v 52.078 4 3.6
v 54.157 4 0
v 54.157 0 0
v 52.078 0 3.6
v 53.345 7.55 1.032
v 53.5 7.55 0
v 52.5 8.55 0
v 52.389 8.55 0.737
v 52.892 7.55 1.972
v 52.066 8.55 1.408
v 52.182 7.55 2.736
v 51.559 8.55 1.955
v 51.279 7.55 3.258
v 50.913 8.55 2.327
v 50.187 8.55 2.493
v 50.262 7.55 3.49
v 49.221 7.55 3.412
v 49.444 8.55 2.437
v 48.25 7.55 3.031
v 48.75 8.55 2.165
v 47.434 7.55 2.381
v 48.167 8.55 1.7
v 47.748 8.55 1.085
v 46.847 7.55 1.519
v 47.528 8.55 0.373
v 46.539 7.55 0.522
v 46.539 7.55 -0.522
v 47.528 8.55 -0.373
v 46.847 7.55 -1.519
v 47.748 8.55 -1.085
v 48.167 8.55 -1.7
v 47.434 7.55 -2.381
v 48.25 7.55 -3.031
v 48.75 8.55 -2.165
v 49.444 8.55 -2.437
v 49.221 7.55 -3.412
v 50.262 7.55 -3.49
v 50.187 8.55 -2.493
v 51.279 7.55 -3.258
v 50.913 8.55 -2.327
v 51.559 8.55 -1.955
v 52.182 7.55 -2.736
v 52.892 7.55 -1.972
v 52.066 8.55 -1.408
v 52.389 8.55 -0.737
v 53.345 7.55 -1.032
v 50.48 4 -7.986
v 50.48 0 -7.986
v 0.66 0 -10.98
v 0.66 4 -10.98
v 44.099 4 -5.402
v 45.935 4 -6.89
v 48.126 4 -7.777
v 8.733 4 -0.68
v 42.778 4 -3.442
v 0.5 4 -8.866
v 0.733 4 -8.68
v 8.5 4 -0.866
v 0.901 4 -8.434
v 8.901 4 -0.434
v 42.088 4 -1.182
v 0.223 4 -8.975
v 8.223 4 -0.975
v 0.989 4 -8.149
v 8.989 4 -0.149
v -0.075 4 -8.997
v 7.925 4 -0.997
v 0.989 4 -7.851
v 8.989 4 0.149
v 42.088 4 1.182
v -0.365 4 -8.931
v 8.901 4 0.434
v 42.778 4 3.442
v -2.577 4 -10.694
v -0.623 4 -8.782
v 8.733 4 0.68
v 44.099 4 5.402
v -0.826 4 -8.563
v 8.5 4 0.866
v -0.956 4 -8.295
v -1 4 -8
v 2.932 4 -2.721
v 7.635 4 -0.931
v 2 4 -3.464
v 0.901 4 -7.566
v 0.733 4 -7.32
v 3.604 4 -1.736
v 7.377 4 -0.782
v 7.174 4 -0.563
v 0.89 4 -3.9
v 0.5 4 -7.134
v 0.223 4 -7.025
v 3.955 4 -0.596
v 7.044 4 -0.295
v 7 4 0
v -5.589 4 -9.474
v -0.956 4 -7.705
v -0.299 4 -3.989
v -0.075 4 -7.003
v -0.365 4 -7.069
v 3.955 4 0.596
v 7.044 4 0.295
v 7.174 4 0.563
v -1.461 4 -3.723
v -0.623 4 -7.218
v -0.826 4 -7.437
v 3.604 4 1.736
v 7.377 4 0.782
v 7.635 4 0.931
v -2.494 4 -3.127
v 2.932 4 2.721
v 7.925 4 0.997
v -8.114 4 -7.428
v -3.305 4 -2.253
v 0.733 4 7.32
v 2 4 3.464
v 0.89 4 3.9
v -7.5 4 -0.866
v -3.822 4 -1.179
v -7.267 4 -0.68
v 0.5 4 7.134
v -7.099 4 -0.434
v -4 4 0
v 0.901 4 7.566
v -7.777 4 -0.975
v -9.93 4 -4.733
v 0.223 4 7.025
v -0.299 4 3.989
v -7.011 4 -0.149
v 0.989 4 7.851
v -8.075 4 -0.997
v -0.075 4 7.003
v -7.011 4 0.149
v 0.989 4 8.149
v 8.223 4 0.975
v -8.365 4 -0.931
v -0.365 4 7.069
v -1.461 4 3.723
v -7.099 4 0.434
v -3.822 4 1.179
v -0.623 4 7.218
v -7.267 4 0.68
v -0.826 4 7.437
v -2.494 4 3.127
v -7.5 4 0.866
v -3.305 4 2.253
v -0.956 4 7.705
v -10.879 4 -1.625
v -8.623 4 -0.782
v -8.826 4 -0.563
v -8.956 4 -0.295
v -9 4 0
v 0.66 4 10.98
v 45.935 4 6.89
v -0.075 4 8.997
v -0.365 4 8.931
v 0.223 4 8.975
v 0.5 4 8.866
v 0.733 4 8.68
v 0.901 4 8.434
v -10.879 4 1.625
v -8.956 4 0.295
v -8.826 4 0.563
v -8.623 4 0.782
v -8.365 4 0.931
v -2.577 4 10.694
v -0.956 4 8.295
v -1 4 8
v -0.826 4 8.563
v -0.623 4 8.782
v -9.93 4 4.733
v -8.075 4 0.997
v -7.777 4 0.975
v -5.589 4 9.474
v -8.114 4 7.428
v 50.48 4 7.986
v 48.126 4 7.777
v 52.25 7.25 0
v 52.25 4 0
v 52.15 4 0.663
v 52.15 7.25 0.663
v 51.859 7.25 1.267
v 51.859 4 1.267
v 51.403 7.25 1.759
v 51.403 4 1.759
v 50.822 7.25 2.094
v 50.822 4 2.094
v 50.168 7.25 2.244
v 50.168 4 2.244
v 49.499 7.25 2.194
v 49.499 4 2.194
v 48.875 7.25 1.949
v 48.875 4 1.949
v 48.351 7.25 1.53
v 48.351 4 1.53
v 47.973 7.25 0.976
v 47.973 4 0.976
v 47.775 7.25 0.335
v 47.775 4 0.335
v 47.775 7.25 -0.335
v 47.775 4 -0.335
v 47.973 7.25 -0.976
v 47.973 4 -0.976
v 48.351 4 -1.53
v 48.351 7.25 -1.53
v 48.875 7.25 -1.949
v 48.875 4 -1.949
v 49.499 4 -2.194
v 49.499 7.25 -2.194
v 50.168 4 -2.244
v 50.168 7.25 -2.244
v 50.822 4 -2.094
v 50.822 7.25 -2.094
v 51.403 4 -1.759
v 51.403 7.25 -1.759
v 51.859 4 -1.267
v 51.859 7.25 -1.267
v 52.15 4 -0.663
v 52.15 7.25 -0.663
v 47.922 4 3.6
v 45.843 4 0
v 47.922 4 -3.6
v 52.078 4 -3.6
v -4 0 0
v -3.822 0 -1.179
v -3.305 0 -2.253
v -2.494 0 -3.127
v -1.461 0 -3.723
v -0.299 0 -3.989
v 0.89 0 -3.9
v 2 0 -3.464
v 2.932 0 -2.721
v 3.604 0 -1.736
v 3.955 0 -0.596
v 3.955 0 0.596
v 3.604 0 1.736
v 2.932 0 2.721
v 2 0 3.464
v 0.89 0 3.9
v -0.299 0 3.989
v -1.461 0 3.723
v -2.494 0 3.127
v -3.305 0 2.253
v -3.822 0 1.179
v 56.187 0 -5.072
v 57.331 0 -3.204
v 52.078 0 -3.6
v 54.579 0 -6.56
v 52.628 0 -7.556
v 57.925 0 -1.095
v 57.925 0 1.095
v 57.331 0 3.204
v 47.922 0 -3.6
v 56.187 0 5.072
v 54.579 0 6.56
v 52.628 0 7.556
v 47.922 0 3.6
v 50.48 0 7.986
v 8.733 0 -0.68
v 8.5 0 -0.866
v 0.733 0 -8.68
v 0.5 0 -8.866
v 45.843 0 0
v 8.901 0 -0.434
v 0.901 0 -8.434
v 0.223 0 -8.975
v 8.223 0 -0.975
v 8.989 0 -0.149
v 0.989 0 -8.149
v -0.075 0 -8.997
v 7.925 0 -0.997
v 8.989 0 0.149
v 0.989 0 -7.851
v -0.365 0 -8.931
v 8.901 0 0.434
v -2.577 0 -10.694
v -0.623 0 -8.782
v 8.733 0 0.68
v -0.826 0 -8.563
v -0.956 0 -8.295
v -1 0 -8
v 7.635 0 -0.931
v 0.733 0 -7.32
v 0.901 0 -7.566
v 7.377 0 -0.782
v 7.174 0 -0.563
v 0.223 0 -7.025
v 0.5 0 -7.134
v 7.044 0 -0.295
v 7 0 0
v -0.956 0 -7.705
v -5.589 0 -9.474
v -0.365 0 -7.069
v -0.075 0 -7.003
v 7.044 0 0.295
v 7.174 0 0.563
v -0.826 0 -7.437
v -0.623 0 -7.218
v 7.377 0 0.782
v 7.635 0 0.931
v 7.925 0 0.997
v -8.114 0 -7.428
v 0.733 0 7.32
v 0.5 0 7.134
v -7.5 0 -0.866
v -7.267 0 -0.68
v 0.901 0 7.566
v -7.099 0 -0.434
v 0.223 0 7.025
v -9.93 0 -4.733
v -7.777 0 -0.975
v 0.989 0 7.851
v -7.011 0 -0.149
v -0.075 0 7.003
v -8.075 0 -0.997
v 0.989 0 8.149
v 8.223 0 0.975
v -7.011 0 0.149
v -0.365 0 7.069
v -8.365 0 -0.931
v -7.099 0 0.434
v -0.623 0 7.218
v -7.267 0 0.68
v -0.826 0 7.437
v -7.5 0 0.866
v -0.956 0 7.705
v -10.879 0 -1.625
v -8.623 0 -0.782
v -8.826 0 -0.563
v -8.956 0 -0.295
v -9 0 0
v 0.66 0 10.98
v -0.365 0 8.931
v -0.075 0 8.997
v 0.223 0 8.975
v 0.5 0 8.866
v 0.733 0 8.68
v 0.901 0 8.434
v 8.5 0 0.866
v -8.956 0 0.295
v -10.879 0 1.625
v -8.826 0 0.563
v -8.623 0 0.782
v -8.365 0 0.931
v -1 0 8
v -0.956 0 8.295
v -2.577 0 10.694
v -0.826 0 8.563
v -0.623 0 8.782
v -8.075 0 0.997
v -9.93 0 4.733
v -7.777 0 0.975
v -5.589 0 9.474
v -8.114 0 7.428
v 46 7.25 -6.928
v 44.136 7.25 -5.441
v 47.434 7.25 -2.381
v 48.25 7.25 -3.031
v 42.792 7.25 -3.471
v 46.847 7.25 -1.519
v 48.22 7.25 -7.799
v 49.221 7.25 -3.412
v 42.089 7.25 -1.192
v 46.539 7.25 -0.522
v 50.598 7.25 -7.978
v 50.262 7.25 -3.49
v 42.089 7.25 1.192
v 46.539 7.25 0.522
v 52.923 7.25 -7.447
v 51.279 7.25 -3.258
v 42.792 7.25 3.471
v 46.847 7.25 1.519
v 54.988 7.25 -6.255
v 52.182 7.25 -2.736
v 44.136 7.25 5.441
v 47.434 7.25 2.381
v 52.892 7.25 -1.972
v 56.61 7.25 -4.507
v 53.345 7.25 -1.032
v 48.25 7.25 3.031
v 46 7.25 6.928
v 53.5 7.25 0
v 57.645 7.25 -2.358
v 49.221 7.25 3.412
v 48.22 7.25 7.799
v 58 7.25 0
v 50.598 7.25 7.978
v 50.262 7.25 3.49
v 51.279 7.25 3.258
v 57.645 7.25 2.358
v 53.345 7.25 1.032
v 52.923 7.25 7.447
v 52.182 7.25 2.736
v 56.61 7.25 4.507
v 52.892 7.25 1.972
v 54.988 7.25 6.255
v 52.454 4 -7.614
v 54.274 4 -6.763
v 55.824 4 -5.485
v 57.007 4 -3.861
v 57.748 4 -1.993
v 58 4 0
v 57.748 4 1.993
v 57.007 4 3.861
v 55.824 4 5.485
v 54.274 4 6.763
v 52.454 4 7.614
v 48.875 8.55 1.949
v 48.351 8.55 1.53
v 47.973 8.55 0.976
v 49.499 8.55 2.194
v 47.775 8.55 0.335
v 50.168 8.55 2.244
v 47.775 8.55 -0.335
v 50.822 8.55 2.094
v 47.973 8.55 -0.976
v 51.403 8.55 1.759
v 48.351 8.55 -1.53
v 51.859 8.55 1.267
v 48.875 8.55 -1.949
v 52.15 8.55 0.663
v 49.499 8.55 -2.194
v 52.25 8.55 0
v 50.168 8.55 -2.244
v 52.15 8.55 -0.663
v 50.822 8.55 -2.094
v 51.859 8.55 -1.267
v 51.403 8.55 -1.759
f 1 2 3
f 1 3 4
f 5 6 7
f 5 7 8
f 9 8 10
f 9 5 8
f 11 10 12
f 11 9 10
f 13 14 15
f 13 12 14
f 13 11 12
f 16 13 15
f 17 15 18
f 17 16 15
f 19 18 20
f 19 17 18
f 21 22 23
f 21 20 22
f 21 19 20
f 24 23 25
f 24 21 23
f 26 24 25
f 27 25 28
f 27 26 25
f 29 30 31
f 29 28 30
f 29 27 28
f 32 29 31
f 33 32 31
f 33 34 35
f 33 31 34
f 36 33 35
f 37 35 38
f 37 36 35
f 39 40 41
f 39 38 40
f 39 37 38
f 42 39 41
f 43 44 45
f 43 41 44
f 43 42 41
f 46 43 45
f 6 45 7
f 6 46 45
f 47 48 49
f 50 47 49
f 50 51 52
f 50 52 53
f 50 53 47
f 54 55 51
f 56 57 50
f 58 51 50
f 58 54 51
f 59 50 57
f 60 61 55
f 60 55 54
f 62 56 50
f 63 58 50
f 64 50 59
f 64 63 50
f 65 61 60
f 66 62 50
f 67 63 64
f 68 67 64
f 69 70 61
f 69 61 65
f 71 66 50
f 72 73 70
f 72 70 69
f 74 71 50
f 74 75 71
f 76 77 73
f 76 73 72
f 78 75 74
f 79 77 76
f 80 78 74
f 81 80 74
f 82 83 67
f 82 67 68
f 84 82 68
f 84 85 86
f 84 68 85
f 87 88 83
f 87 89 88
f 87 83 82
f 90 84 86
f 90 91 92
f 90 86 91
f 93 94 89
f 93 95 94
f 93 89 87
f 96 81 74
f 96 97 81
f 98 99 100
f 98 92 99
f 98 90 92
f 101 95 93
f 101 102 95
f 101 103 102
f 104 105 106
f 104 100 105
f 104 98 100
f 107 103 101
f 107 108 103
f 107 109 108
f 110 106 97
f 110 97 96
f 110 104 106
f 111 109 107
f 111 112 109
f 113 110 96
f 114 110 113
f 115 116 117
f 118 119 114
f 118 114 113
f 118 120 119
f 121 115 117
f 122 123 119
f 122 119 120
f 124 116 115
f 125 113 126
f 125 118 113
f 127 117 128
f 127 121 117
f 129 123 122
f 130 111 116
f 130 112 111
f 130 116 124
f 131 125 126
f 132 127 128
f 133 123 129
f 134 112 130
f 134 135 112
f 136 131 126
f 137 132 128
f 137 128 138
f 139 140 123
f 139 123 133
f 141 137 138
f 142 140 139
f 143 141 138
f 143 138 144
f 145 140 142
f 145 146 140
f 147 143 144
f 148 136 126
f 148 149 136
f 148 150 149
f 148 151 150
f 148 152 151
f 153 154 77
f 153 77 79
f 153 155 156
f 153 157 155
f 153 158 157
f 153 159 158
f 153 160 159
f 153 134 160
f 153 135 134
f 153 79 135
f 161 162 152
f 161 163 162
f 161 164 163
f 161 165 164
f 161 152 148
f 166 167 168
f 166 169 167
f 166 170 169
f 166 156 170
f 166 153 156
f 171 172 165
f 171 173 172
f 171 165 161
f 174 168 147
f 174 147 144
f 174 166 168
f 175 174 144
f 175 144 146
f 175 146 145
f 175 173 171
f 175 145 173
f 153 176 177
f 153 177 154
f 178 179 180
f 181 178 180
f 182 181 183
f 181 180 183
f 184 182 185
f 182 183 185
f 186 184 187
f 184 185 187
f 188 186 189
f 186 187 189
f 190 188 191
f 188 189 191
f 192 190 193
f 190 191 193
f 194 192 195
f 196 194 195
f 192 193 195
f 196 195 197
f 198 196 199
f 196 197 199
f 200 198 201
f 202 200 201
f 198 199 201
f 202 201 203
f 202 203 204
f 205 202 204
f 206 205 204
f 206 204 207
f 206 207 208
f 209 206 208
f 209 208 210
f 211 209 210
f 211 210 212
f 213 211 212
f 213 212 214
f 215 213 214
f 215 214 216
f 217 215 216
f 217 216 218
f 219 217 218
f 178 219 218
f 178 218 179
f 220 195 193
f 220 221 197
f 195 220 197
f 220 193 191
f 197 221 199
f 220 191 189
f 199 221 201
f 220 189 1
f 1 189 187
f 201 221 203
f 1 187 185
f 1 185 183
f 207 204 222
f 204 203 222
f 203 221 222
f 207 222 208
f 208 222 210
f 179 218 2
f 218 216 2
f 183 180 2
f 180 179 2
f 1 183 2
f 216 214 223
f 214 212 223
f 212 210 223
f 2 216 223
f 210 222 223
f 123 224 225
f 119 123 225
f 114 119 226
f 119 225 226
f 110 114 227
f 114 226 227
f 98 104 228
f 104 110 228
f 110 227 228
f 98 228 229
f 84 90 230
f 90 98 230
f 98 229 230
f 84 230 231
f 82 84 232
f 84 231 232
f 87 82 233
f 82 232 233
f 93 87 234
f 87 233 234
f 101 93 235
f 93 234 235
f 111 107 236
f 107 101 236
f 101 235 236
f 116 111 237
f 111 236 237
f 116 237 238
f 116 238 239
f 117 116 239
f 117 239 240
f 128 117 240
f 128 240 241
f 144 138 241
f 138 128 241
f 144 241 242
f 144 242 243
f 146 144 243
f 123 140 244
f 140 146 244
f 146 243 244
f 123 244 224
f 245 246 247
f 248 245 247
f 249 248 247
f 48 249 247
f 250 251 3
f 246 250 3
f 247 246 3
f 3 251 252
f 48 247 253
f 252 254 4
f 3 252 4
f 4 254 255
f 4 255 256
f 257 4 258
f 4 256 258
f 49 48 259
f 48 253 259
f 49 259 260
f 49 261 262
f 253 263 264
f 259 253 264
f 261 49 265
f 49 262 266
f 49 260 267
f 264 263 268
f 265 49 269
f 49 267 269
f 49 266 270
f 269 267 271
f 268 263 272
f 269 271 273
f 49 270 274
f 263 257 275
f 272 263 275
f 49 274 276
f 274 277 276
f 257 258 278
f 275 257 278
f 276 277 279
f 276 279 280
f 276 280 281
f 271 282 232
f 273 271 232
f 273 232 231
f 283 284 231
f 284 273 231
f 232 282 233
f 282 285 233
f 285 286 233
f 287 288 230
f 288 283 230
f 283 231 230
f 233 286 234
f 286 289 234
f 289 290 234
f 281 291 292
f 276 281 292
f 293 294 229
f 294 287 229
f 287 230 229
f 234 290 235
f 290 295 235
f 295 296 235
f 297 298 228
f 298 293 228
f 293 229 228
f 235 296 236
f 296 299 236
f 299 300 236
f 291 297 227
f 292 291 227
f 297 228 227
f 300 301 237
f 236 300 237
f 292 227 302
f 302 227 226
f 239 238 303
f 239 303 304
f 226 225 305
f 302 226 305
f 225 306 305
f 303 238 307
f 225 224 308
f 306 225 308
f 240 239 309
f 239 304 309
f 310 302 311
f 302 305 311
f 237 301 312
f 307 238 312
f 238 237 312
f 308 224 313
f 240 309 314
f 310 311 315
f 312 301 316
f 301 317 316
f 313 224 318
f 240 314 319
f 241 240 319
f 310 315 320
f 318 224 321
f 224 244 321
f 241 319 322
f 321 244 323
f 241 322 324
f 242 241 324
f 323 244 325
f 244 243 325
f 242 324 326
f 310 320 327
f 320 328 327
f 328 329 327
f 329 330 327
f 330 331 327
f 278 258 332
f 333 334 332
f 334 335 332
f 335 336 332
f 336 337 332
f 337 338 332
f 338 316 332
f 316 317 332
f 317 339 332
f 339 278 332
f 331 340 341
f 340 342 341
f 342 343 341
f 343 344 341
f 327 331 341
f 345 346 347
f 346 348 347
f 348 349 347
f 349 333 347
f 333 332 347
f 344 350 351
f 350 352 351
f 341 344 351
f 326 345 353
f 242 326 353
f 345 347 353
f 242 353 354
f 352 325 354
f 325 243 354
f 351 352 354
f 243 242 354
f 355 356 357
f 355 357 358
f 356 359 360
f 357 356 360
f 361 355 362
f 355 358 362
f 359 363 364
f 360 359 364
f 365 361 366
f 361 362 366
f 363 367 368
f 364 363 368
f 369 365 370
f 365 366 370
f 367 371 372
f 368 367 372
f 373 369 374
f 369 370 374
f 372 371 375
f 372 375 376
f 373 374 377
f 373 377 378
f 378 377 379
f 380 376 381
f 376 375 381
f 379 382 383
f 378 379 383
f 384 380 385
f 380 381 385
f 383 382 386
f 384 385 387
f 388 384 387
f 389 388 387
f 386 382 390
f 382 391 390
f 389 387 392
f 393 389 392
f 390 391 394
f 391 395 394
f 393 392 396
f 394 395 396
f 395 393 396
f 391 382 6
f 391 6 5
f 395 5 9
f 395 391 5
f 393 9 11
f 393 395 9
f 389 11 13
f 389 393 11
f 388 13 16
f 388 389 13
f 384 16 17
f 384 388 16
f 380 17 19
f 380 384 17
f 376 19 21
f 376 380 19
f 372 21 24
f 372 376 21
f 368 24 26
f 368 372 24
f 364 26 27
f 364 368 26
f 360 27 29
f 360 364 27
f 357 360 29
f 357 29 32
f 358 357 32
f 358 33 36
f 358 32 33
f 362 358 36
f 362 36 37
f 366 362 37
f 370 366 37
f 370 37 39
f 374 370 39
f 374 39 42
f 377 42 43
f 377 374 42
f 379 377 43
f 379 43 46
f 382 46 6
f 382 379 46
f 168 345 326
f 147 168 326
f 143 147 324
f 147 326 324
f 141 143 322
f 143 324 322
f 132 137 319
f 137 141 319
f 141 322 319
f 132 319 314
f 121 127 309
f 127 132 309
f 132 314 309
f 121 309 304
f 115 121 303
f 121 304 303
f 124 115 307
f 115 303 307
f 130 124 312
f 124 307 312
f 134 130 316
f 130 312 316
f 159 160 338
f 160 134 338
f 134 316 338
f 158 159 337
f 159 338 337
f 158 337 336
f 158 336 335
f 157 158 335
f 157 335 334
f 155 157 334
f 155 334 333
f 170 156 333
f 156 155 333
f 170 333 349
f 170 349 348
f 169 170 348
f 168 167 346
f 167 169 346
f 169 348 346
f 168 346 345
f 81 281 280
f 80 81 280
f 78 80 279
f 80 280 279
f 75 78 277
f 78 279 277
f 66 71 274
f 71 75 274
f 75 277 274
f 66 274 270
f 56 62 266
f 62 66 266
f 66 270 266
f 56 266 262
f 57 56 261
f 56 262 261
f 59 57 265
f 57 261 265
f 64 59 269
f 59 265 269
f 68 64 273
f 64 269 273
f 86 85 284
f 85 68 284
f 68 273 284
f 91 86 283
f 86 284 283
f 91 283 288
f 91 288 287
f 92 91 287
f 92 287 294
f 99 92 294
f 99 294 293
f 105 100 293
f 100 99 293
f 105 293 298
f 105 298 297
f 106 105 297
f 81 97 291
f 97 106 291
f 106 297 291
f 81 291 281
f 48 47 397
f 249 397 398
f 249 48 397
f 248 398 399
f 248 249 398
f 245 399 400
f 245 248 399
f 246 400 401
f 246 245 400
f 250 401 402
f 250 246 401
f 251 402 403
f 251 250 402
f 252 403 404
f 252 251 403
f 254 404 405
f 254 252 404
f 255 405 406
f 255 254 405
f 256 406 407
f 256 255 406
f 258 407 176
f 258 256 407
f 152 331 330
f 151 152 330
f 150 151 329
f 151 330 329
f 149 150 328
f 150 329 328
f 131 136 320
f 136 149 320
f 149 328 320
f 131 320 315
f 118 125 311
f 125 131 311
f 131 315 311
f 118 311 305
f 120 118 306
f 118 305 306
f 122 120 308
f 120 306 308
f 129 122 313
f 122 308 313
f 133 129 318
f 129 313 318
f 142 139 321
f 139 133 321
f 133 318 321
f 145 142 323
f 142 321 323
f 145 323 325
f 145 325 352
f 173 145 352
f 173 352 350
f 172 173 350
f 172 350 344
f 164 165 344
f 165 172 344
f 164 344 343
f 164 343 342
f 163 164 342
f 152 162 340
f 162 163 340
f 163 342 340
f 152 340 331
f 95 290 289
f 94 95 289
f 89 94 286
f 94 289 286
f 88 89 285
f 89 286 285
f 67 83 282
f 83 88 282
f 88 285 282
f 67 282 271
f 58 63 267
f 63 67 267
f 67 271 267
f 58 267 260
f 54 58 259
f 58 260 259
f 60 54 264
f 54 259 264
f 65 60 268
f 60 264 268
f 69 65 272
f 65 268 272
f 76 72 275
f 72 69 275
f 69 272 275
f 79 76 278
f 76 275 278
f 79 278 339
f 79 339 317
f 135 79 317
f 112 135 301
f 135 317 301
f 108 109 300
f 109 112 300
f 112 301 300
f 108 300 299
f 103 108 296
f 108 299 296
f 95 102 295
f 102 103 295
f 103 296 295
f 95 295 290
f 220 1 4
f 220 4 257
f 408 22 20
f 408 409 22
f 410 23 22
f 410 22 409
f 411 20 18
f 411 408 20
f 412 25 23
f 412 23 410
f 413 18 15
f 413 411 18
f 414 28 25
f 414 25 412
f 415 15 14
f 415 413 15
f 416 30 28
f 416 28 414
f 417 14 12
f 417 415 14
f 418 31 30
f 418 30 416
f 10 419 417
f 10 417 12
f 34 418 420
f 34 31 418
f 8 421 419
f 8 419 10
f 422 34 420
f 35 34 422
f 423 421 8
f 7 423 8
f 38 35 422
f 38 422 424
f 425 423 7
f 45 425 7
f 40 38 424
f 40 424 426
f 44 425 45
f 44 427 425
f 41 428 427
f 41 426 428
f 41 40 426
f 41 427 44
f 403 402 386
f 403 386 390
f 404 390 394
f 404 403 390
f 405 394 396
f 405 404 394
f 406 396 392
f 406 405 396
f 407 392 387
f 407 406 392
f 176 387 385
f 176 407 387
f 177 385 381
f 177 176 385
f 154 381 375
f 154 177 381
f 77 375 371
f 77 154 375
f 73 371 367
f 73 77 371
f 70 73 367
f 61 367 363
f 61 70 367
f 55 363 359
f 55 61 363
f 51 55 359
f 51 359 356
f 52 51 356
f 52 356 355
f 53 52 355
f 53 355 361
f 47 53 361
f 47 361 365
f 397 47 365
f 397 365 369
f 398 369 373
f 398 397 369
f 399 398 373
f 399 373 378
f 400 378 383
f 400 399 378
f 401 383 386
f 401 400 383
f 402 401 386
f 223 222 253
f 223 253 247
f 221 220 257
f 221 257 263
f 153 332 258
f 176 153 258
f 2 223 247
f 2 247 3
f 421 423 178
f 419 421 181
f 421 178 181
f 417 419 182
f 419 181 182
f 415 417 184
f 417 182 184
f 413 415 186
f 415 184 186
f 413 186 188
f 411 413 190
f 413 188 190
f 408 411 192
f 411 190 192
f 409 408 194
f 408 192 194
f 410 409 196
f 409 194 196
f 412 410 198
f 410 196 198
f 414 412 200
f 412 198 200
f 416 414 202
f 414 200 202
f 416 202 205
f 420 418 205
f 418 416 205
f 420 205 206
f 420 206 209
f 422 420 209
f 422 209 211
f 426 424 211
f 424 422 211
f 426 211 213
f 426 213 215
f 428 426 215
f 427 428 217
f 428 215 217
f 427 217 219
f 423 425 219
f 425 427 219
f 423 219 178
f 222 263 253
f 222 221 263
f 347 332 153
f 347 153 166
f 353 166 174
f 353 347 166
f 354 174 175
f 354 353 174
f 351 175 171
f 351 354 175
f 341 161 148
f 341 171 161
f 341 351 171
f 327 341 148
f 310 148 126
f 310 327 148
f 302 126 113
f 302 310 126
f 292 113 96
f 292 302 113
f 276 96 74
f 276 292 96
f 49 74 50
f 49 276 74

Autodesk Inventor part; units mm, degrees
ref_plane "YZ Plane" through (0, 0, 0) normal (1, 0, 0) x (0, 1, 0)
ref_plane "XZ Plane" through (0, 0, 0) normal (0, 1, 0) x (-1, 0, 0)
ref_plane "XY Plane" through (0, 0, 0) normal (0, 0, 1) x (1, 0, 0)
sketch "Эскиз1" plane through (0, 0, 0) normal (0, 1, 0) x (-1, 0, 0)
  arc A0 (-0.66, -10.9802) -> (-0.66, 10.9802) centre (0, 0) ccw
  line L0 (0, 0) -> (-50, 0) construction
  arc A1 (-50.48, 7.9856) -> (-50.48, -7.9856) centre (-50, 0) ccw
  circle A2 centre (-50, 0) radius 2.25
  circle A3 centre (0, 0) radius 4
  line L1 (-0.66, 10.9802) -> (-50.48, 7.9856)
  line L2 (-50.48, -7.9856) -> (-0.66, -10.9802)
  line L3 (0, 14.7919) -> (0, -15.3295) construction
  circle A4 centre (0, 8) radius 1
  circle A5 centre (-8, 0) radius 1
  circle A6 centre (0, -8) radius 1
  circle A7 centre (8, 0) radius 1
  dimension "d0" = 22
  dimension "d1" = 16
  dimension "d2" = 4.5
  dimension "d3" = 8
  dimension "d4" = 50
  dimension "d7" = 2
  dimension "d8" = 8
  dimension "d25" = 360
extrude "Выдавливание1" add sketch "Эскиз1" along normal blind 4
sketch "Эскиз3" plane through (0, 0, 0) normal (0, -1, 0) x (1, 0, 0)
  circle A0 centre (50, 0) radius 2.25 projected
  circle A1 centre (50, 0) radius 8
  arc A2 (50.48, -7.9856) -> (50.48, 7.9856) centre (50, 0) ccw projected
  point P0 (0, 0)
extrude "Выдавливание3" add sketch "Эскиз3" against normal blind 7.25
sketch "Эскиз5" plane through (0, 4, 0) normal (0, 1, 0) x (1, 0, 0)
  circle A0 centre (50, 0) radius 2.25 projected
  line L0 (54.1569, 0) -> (52.0785, -3.6)
  line L1 (52.0785, -3.6) -> (47.9215, -3.6)
  line L2 (47.9215, -3.6) -> (45.8431, 0)
  line L3 (45.8431, 0) -> (47.9215, 3.6)
  line L4 (47.9215, 3.6) -> (52.0785, 3.6)
  line L5 (52.0785, 3.6) -> (54.1569, 0)
  point P0 (0, 0)
  dimension "d20" = 7.2
  dimension "d31" = 4.1569
  dimension "d32" = 3.6
  dimension "d33" = 50
extrude "Выдавливание8" cut sketch "Эскиз5" against normal blind 4
sketch "Эскиз8" plane through (50, 7.25, 0) normal (0, 1, 0) x (1, 0, 0)
  circle A0 centre (0, 0) radius 2.25 projected
  circle A1 centre (0, 0) radius 2.2361
  circle A2 centre (0, 0) radius 3.5
  point P0 (-50, 0)
  dimension "d38" = 7
extrude "Выдавливание9" add sketch "Эскиз8" along normal blind 1.3 contours A2
chamfer "Фаска2" distance 1 angle 45 1 edges at (46.5, 8.55, 0)
properties part number "04-01-Качалка"
